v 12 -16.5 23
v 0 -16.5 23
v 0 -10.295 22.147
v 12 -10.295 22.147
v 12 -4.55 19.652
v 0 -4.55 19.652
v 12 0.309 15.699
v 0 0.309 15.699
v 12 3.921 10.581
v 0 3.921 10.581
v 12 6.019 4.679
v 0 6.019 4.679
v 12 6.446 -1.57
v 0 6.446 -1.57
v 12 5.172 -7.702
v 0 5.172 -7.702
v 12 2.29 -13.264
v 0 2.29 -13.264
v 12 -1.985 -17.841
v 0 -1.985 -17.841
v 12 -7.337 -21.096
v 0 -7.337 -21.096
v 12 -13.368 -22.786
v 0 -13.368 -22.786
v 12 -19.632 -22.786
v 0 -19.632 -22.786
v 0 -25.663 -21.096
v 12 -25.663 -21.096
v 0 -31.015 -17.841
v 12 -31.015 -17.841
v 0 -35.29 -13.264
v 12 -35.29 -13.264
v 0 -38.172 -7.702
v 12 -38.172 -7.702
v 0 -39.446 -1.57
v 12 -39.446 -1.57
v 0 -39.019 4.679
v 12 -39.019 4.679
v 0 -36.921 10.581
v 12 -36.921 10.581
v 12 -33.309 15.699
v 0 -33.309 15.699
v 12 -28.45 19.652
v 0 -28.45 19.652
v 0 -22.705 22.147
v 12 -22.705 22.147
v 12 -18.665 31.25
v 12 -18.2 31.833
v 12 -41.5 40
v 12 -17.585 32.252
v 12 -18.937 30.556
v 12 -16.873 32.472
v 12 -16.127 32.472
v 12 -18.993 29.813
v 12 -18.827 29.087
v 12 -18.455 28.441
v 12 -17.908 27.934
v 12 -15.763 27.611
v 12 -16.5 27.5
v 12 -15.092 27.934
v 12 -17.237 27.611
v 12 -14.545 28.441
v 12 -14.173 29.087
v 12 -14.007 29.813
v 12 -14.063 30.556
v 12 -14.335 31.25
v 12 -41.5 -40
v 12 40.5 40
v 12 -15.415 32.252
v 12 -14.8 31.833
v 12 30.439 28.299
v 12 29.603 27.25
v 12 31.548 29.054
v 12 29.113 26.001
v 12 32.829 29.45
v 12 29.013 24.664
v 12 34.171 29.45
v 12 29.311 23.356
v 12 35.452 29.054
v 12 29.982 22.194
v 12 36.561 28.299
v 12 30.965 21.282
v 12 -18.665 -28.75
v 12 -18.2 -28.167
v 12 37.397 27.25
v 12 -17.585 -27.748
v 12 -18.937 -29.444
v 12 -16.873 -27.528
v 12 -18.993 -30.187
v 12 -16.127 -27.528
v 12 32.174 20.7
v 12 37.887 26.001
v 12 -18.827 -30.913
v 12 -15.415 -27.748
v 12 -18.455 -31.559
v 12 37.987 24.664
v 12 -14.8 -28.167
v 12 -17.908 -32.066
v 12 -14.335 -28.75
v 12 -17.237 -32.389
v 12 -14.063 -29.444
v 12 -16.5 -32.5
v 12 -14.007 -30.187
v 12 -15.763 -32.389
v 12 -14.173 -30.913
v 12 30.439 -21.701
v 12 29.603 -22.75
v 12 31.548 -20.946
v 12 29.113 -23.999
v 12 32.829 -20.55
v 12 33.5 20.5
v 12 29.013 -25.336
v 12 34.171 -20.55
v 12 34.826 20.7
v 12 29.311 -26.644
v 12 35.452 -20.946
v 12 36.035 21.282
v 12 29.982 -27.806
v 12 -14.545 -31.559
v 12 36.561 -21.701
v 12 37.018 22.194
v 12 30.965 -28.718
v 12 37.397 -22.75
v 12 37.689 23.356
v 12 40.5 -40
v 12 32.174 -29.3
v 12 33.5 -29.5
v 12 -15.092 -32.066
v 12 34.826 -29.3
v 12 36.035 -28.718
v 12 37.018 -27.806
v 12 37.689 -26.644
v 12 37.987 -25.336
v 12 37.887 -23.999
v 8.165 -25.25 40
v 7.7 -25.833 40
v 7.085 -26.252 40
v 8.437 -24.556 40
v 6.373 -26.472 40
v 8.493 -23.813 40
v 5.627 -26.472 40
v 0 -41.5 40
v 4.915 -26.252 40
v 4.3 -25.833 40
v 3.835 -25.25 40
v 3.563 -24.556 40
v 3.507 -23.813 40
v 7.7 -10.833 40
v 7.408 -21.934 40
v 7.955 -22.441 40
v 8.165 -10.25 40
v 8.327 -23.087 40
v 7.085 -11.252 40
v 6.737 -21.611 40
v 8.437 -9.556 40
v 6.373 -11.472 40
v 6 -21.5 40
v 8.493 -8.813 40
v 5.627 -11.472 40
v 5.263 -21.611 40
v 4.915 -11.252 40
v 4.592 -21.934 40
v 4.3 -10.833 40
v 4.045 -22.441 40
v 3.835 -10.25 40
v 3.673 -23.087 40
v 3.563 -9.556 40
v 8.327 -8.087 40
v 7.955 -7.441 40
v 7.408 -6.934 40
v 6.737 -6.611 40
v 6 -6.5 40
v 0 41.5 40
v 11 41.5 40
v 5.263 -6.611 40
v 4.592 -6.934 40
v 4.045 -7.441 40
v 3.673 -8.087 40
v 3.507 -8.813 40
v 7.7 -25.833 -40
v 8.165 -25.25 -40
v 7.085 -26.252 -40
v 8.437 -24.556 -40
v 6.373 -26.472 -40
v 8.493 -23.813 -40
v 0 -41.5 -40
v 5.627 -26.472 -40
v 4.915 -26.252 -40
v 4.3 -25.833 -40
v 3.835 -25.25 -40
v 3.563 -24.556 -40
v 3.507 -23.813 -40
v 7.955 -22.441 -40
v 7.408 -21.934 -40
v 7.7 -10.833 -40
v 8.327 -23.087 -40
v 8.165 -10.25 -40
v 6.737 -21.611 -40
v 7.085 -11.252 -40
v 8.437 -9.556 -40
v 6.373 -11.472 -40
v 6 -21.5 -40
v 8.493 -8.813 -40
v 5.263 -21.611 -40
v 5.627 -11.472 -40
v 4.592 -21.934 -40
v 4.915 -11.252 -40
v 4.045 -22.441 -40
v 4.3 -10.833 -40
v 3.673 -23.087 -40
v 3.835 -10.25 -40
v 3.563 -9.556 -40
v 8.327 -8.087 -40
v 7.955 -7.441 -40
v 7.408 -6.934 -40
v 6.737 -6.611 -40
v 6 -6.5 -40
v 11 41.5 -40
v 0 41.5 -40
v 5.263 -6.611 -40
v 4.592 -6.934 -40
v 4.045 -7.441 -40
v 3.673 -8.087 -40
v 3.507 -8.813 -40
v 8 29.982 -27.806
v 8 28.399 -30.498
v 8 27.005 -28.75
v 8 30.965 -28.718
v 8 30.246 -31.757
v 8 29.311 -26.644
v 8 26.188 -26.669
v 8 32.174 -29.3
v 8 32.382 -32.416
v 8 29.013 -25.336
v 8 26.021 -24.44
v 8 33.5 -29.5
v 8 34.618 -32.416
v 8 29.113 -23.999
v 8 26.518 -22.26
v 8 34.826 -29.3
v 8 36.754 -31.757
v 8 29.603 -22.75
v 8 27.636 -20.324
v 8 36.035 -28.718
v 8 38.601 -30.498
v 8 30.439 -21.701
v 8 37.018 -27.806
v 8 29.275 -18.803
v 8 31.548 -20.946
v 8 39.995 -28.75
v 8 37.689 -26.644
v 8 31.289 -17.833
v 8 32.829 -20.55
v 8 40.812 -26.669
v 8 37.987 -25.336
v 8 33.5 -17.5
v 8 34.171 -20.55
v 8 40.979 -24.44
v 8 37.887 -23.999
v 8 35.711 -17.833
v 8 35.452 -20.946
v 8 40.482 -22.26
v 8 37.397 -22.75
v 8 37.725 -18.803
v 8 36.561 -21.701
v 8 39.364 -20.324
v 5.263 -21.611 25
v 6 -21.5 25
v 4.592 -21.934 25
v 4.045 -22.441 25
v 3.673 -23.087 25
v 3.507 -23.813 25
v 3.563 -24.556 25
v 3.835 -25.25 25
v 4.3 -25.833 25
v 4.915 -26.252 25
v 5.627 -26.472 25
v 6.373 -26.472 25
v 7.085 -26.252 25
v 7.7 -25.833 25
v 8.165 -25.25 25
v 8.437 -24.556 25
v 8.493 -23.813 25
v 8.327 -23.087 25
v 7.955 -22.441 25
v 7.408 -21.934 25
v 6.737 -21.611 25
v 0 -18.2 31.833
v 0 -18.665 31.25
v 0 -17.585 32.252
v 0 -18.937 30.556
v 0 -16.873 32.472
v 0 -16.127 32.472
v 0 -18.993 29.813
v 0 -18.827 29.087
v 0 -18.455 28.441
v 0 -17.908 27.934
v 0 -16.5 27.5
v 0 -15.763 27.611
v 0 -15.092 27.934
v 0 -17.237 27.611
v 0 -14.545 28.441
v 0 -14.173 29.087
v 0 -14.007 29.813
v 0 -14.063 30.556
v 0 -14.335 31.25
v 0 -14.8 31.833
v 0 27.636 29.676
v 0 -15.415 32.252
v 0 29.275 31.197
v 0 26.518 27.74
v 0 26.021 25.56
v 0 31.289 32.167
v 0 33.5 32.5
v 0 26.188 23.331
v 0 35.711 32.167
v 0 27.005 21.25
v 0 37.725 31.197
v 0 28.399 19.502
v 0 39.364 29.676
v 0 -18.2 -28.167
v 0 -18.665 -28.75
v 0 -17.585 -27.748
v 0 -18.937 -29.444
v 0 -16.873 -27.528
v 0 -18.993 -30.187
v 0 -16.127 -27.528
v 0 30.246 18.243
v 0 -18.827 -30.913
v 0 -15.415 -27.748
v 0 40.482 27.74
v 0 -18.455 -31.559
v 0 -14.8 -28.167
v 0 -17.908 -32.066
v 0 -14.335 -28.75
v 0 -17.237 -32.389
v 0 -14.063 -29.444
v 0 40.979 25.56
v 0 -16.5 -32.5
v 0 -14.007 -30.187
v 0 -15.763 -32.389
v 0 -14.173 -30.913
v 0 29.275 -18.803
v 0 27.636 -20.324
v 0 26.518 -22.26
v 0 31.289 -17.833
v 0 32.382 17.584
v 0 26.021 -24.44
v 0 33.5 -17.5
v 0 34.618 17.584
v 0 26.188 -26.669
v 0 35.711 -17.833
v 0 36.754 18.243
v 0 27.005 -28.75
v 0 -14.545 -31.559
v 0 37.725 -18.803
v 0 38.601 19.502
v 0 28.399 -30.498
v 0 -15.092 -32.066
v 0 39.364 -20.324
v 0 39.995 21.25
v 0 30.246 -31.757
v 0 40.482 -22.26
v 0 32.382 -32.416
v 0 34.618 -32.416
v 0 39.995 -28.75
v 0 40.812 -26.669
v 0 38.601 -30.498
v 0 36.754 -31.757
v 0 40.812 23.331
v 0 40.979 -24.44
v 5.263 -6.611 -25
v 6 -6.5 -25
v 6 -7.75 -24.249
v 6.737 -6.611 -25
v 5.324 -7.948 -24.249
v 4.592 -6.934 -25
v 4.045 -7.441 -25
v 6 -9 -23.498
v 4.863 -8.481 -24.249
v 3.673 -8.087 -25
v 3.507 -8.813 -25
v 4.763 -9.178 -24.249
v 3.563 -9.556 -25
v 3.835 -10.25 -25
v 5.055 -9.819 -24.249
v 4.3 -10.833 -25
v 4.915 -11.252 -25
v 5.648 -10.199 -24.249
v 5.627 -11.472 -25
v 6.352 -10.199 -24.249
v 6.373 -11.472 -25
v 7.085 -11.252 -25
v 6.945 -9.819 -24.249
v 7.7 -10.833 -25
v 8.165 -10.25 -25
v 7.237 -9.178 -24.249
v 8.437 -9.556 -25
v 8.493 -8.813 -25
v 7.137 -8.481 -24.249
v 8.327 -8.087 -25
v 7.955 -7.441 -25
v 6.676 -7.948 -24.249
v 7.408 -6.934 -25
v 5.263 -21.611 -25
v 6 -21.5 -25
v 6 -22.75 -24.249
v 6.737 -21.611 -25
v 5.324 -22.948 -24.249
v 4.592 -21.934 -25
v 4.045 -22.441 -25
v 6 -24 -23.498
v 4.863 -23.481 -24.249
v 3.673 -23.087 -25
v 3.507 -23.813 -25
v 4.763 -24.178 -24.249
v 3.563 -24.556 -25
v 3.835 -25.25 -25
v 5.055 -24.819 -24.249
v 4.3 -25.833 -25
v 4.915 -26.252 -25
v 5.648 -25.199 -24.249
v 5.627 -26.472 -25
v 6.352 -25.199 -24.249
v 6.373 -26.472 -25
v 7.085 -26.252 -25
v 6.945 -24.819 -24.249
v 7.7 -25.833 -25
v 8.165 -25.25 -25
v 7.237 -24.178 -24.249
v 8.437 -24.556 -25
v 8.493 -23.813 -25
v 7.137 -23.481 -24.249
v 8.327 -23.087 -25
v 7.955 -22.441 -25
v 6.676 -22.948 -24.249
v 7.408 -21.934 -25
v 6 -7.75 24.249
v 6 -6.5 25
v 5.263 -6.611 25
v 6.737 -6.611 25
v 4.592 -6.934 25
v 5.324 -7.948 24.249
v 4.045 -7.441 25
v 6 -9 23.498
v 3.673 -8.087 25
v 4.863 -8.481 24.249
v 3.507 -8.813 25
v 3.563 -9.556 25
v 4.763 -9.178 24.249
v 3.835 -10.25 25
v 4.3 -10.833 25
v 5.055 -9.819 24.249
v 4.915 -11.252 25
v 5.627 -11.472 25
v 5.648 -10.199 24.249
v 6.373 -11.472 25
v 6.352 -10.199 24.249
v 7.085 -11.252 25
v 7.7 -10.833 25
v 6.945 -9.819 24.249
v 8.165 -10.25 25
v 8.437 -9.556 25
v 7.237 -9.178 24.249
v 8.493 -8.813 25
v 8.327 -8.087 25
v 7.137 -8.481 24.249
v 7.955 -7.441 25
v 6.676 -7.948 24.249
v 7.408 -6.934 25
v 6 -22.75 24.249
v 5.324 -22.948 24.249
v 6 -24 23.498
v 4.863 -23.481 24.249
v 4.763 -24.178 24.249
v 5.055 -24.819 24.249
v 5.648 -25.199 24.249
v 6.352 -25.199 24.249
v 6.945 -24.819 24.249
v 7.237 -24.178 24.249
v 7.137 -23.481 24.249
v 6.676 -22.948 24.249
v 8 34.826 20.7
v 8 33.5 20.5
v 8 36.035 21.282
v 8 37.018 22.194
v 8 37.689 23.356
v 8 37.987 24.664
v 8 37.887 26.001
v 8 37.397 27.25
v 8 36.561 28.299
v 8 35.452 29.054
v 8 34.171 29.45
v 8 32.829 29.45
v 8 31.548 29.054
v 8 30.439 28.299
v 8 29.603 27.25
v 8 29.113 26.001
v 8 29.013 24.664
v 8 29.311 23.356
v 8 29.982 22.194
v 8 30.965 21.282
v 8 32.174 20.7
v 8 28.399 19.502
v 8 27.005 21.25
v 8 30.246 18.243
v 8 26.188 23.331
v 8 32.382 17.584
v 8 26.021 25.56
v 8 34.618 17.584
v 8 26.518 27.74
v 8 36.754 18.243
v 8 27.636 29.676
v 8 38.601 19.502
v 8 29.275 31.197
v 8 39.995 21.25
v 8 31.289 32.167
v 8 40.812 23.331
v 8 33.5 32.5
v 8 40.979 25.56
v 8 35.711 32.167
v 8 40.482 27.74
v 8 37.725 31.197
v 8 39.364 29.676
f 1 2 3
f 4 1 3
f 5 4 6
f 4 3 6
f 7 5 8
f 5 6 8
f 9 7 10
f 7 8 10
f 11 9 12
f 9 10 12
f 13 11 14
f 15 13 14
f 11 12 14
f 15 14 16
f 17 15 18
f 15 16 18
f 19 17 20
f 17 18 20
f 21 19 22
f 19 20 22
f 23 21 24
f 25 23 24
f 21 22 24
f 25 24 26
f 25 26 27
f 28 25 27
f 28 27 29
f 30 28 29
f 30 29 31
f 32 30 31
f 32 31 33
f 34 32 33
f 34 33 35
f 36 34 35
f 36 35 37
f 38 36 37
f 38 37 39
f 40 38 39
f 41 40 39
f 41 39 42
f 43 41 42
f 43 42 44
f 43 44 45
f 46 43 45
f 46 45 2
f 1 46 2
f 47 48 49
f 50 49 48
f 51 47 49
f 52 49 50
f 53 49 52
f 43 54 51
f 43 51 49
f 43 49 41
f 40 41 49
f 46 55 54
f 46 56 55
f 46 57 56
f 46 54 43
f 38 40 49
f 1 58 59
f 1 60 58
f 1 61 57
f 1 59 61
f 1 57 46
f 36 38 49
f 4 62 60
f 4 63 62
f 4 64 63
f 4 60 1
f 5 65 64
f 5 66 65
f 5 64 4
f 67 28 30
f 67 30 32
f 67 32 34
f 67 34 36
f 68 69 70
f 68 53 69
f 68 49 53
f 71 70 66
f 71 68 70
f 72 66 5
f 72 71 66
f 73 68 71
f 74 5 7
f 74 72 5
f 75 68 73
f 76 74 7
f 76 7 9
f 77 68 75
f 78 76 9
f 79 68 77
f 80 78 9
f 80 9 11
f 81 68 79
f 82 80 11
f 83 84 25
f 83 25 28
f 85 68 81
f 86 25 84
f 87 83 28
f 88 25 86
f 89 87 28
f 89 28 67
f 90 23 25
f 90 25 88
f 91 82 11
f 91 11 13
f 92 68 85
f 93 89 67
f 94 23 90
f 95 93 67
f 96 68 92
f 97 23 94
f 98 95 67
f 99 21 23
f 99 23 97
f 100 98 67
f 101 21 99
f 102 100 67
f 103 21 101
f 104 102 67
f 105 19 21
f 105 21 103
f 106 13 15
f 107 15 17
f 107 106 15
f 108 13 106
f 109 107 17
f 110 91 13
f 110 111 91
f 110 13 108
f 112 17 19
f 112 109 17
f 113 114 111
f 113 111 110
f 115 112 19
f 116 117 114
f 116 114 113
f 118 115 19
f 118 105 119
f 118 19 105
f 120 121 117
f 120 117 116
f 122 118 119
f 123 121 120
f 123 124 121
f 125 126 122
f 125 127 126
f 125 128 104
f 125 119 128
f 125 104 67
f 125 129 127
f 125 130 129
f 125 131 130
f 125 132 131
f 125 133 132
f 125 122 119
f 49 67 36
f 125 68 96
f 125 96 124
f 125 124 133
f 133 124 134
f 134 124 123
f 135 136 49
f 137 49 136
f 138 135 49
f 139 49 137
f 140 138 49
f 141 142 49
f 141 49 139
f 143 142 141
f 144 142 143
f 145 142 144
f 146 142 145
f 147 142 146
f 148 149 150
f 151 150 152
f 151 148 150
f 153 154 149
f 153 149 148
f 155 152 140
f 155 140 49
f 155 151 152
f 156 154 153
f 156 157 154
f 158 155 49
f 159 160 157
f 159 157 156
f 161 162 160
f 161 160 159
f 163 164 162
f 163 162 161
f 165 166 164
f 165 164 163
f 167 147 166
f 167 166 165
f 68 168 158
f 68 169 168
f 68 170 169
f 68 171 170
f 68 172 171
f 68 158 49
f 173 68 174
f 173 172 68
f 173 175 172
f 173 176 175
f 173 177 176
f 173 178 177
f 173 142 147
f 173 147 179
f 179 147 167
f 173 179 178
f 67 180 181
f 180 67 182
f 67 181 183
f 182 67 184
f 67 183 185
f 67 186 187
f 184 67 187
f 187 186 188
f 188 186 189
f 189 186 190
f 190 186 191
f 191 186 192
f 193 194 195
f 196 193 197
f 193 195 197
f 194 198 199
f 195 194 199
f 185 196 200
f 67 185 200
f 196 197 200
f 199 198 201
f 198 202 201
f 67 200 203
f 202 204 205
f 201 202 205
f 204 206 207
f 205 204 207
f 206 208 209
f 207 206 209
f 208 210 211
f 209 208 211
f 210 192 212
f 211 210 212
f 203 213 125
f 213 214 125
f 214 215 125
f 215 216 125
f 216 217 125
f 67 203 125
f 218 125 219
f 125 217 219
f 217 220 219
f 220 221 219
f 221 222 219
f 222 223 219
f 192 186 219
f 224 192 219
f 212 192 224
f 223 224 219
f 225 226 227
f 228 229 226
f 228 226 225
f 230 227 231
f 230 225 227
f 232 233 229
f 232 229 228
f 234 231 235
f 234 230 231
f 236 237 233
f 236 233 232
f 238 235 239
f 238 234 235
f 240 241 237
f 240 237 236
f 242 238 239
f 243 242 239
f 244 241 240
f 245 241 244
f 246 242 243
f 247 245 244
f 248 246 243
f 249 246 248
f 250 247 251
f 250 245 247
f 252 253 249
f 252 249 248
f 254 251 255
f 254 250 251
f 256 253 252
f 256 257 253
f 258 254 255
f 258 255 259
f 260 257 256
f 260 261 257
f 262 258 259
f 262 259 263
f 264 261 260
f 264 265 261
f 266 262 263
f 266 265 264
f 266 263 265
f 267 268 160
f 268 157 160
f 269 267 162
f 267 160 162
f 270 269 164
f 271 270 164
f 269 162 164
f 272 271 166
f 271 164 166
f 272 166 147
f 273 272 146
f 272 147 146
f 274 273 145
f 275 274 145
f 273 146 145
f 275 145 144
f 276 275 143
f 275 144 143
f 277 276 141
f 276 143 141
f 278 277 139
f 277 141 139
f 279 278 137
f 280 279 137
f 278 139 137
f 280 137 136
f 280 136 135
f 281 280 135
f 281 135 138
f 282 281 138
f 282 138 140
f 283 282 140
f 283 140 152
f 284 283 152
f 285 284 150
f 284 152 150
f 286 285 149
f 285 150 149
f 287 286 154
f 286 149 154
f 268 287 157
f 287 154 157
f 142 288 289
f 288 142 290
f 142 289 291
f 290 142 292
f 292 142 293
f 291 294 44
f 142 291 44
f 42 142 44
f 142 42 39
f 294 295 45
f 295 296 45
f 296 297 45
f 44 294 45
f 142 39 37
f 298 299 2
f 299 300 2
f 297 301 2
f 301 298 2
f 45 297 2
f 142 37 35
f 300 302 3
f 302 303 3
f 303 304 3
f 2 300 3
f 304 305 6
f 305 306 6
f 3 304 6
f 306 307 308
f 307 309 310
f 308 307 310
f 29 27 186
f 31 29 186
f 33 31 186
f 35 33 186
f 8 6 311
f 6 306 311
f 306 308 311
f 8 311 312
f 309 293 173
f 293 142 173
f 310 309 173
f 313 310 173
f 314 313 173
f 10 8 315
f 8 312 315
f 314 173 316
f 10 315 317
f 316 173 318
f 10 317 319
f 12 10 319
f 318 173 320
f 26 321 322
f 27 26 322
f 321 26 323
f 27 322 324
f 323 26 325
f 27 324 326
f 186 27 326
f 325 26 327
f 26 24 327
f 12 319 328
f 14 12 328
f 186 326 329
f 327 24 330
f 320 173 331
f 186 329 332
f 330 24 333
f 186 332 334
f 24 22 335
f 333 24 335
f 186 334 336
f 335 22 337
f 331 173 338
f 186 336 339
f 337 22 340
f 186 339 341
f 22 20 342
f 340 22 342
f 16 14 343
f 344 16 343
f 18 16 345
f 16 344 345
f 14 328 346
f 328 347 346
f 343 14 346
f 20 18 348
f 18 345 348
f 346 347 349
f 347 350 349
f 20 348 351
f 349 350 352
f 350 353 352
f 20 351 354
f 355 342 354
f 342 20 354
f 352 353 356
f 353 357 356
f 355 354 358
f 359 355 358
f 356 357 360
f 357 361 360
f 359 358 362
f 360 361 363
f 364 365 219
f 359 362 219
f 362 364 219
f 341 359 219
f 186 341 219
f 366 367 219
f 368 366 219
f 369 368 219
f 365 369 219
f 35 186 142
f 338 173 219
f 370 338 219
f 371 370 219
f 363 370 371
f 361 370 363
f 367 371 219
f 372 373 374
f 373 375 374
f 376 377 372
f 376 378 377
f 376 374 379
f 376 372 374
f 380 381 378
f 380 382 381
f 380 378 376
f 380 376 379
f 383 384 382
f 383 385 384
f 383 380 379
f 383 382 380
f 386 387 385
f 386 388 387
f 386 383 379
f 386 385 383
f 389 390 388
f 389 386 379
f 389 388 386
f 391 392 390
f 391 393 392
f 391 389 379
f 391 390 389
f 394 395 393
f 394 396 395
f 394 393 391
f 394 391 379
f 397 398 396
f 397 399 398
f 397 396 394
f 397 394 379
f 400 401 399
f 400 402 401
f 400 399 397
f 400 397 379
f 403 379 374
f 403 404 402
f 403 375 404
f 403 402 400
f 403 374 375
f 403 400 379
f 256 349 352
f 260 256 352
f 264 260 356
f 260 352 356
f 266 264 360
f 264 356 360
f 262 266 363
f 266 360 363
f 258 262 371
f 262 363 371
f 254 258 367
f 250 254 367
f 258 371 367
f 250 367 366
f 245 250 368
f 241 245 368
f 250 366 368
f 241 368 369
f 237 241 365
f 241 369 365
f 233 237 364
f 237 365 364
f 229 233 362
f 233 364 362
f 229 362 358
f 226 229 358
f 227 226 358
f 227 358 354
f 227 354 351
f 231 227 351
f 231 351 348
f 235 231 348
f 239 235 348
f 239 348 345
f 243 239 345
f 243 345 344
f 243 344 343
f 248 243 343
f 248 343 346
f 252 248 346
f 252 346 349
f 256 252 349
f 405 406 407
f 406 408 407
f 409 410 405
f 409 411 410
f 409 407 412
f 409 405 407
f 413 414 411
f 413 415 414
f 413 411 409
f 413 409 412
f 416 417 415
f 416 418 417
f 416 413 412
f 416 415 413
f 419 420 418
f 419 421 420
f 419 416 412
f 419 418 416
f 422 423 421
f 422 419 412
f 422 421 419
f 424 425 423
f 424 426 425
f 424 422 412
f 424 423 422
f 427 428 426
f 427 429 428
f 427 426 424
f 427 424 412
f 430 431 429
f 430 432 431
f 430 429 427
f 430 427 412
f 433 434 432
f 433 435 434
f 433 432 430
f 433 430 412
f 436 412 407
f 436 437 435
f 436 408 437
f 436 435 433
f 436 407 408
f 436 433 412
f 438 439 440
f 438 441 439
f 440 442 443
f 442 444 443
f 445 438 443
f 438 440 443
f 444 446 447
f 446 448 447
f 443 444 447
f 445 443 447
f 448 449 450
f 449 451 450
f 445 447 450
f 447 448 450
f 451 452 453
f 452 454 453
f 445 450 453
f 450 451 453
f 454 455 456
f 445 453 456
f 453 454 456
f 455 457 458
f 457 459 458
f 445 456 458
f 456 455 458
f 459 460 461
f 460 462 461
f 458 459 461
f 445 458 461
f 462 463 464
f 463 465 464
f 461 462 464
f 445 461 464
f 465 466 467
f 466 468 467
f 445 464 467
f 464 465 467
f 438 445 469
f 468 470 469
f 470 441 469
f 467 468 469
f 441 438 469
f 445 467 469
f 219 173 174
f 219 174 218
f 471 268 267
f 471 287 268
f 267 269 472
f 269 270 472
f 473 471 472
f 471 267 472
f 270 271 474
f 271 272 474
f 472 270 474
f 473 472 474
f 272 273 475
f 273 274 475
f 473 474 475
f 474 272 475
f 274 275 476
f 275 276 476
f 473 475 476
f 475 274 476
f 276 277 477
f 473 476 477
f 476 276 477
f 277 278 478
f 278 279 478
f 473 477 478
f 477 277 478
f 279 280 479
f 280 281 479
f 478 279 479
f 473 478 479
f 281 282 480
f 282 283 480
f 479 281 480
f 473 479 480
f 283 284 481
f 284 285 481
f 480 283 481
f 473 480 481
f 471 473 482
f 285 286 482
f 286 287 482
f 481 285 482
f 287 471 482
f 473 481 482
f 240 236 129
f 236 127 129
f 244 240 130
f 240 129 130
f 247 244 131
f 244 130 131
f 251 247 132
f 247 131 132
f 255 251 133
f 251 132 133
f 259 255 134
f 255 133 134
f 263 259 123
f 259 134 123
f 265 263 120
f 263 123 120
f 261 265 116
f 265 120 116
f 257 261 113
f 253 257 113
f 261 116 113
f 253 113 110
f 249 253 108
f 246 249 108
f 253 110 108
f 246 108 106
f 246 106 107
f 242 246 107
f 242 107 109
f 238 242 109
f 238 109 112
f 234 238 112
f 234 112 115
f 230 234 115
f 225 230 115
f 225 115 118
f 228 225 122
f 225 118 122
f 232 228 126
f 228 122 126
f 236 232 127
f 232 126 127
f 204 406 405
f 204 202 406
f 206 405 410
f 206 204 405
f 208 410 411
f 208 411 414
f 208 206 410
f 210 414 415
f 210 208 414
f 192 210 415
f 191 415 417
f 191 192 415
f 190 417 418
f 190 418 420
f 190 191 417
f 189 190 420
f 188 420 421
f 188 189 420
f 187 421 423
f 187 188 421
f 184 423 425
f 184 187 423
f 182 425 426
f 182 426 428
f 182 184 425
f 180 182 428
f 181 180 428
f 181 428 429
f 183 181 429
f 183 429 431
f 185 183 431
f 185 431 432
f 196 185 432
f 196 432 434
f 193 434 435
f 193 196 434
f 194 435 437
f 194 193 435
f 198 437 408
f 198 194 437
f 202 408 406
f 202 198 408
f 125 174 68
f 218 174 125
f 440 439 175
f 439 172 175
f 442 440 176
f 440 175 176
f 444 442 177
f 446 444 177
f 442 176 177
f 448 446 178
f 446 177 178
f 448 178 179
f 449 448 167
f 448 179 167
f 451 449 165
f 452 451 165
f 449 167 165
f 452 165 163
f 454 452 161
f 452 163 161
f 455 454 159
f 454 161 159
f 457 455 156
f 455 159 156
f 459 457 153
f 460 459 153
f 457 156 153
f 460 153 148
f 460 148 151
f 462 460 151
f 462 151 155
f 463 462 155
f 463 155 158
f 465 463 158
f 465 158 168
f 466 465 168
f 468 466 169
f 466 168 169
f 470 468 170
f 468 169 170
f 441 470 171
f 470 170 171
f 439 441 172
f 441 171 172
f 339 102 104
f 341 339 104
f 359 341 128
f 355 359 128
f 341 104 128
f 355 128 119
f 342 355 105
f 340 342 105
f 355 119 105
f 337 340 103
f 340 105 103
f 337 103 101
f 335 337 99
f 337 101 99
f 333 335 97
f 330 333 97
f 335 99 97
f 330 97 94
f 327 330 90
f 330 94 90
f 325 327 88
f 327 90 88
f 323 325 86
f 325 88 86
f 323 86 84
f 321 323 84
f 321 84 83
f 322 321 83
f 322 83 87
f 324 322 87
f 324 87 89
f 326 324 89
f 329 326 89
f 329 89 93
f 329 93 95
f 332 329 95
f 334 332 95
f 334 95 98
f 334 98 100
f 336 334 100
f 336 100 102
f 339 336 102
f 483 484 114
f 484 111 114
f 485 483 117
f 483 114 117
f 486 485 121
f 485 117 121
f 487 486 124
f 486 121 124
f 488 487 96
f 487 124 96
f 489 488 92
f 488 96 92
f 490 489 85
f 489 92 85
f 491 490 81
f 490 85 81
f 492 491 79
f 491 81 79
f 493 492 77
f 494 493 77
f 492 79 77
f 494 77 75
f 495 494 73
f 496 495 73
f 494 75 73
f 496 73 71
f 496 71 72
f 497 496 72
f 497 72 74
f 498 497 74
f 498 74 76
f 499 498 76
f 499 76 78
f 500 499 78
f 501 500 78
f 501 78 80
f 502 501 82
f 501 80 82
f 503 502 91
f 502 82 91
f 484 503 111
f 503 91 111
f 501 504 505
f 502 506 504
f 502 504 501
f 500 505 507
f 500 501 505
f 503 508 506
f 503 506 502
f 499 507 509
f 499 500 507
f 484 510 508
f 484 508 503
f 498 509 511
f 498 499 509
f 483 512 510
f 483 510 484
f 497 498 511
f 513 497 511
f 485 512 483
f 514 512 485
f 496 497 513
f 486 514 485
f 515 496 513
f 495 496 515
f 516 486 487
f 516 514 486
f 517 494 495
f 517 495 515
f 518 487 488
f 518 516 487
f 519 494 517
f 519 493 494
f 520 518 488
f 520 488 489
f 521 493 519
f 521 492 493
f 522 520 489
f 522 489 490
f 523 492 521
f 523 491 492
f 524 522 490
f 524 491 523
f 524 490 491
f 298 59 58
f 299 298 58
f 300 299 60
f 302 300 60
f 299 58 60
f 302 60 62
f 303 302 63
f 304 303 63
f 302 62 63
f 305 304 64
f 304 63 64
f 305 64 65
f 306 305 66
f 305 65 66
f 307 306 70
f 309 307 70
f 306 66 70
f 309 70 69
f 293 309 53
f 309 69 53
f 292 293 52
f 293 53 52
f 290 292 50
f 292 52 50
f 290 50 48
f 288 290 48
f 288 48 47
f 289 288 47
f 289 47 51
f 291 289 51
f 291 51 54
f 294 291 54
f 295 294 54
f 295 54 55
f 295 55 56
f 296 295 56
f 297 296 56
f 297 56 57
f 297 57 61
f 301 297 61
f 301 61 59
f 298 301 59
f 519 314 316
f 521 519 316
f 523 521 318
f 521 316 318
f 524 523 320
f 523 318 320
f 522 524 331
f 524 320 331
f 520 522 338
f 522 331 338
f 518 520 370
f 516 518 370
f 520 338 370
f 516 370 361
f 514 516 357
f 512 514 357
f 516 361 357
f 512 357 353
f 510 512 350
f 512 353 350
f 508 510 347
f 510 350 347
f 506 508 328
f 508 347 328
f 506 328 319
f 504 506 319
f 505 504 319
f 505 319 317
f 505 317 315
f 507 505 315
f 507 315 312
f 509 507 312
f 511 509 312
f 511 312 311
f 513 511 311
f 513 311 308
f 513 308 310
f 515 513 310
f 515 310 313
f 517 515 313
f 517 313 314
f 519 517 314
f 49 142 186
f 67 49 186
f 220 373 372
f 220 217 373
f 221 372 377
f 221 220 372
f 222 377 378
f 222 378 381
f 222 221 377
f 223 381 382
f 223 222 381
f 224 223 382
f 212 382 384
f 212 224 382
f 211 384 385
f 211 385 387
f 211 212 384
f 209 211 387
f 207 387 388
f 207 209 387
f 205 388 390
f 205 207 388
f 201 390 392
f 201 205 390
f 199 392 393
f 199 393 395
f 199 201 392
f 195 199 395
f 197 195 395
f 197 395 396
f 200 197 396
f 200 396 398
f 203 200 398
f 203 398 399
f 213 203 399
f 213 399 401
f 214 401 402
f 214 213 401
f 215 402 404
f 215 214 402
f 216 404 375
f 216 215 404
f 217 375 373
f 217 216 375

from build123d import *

# Parameters (mm, degrees)
SKETCH_1_W                  = 80
SKETCH_1_H                  = 83
EXTRUDE_1_DEPTH             = 12
HOLE_WIZARD_1_D             = 9
HOLE_WIZARD_1_CBORE_D       = 15
HOLE_WIZARD_1_CBORE_DEPTH   = 8
HOLE_WIZARD_1_2_D           = 46
HOLE_WIZARD_M6_2_D          = 5
HOLE_WIZARD_M6_1_AT_2_COUNT = 2
HOLE_WIZARD_M6_1_AT_2_PITCH = 15
CHAMFER_1_SIZE              = 1


with BuildPart() as part:
    # 草图1 → 凸台-拉伸1 (new body)
    with BuildSketch(Plane(origin=(0, 0, 0), x_dir=(0, 0, -1), z_dir=(1, 0, 0))):
        Rectangle(SKETCH_1_W, SKETCH_1_H)
    extrude(amount=EXTRUDE_1_DEPTH)

    # Hole Wizard 1 (through all)
    with Locations(Plane.ZY):
        with Locations((-25, 33.5), (25, 33.5)):
            CounterBoreHole(HOLE_WIZARD_1_D / 2, HOLE_WIZARD_1_CBORE_D / 2, HOLE_WIZARD_1_CBORE_DEPTH)

    # Hole Wizard 1 2 (through all)
    with Locations(Plane(origin=(12, 0, 0), x_dir=(0, 0, -1), z_dir=(1, 0, 0))):
        with Locations((0, -16.5)):
            Hole(HOLE_WIZARD_1_2_D / 2)

    # M6 螺纹孔2 (through all)
    with Locations(Plane.ZY):
        with Locations((-30, -16.5), (30, -16.5)):
            Hole(HOLE_WIZARD_M6_2_D / 2)

    # 草图8 → M6 螺纹孔1 (revolve, cut)
    with BuildSketch(Plane(origin=(6, -9, -40), x_dir=(0, 1, 0), z_dir=(1, 0, 0))):
        Polygon((0, 0), (0, 16.502151548), (2.5, 15), (2.5, 0), align=None)
    hole_wizard_m6_1 = revolve(axis=Axis((6, -9, -46.35), (0, 0, 1)), mode=Mode.SUBTRACT)

    # M6 螺纹孔1 at 2: M6 螺纹孔1 ×2
    with Locations(*[(0, -i * HOLE_WIZARD_M6_1_AT_2_PITCH, 0) for i in range(1, HOLE_WIZARD_M6_1_AT_2_COUNT)]):
        add(hole_wizard_m6_1, mode=Mode.SUBTRACT)

    # 镜向1: M6 螺纹孔1 across plane
    add(hole_wizard_m6_1.mirror(Plane.XY), mode=Mode.SUBTRACT)

    # 镜向1 copy 1 sketch → 镜向1 copy 1 (revolve, cut)
    with BuildSketch(Plane(origin=(6, -24, 40), x_dir=(0, 1, 0), z_dir=(1, 0, 0))):
        Polygon((0, 0), (0, -16.502151548), (2.5, -15), (2.5, 0), align=None)
    revolve(axis=Axis((6, -24, 46.35), (0, 0, 1)), mode=Mode.SUBTRACT)

    # 倒角1
    chamfer_1_edges = [part.edges().sort_by_distance(p)[0] for p in [
        (12, 41.5, 0),
    ]]
    chamfer(chamfer_1_edges, length=CHAMFER_1_SIZE)


solid = part.part
